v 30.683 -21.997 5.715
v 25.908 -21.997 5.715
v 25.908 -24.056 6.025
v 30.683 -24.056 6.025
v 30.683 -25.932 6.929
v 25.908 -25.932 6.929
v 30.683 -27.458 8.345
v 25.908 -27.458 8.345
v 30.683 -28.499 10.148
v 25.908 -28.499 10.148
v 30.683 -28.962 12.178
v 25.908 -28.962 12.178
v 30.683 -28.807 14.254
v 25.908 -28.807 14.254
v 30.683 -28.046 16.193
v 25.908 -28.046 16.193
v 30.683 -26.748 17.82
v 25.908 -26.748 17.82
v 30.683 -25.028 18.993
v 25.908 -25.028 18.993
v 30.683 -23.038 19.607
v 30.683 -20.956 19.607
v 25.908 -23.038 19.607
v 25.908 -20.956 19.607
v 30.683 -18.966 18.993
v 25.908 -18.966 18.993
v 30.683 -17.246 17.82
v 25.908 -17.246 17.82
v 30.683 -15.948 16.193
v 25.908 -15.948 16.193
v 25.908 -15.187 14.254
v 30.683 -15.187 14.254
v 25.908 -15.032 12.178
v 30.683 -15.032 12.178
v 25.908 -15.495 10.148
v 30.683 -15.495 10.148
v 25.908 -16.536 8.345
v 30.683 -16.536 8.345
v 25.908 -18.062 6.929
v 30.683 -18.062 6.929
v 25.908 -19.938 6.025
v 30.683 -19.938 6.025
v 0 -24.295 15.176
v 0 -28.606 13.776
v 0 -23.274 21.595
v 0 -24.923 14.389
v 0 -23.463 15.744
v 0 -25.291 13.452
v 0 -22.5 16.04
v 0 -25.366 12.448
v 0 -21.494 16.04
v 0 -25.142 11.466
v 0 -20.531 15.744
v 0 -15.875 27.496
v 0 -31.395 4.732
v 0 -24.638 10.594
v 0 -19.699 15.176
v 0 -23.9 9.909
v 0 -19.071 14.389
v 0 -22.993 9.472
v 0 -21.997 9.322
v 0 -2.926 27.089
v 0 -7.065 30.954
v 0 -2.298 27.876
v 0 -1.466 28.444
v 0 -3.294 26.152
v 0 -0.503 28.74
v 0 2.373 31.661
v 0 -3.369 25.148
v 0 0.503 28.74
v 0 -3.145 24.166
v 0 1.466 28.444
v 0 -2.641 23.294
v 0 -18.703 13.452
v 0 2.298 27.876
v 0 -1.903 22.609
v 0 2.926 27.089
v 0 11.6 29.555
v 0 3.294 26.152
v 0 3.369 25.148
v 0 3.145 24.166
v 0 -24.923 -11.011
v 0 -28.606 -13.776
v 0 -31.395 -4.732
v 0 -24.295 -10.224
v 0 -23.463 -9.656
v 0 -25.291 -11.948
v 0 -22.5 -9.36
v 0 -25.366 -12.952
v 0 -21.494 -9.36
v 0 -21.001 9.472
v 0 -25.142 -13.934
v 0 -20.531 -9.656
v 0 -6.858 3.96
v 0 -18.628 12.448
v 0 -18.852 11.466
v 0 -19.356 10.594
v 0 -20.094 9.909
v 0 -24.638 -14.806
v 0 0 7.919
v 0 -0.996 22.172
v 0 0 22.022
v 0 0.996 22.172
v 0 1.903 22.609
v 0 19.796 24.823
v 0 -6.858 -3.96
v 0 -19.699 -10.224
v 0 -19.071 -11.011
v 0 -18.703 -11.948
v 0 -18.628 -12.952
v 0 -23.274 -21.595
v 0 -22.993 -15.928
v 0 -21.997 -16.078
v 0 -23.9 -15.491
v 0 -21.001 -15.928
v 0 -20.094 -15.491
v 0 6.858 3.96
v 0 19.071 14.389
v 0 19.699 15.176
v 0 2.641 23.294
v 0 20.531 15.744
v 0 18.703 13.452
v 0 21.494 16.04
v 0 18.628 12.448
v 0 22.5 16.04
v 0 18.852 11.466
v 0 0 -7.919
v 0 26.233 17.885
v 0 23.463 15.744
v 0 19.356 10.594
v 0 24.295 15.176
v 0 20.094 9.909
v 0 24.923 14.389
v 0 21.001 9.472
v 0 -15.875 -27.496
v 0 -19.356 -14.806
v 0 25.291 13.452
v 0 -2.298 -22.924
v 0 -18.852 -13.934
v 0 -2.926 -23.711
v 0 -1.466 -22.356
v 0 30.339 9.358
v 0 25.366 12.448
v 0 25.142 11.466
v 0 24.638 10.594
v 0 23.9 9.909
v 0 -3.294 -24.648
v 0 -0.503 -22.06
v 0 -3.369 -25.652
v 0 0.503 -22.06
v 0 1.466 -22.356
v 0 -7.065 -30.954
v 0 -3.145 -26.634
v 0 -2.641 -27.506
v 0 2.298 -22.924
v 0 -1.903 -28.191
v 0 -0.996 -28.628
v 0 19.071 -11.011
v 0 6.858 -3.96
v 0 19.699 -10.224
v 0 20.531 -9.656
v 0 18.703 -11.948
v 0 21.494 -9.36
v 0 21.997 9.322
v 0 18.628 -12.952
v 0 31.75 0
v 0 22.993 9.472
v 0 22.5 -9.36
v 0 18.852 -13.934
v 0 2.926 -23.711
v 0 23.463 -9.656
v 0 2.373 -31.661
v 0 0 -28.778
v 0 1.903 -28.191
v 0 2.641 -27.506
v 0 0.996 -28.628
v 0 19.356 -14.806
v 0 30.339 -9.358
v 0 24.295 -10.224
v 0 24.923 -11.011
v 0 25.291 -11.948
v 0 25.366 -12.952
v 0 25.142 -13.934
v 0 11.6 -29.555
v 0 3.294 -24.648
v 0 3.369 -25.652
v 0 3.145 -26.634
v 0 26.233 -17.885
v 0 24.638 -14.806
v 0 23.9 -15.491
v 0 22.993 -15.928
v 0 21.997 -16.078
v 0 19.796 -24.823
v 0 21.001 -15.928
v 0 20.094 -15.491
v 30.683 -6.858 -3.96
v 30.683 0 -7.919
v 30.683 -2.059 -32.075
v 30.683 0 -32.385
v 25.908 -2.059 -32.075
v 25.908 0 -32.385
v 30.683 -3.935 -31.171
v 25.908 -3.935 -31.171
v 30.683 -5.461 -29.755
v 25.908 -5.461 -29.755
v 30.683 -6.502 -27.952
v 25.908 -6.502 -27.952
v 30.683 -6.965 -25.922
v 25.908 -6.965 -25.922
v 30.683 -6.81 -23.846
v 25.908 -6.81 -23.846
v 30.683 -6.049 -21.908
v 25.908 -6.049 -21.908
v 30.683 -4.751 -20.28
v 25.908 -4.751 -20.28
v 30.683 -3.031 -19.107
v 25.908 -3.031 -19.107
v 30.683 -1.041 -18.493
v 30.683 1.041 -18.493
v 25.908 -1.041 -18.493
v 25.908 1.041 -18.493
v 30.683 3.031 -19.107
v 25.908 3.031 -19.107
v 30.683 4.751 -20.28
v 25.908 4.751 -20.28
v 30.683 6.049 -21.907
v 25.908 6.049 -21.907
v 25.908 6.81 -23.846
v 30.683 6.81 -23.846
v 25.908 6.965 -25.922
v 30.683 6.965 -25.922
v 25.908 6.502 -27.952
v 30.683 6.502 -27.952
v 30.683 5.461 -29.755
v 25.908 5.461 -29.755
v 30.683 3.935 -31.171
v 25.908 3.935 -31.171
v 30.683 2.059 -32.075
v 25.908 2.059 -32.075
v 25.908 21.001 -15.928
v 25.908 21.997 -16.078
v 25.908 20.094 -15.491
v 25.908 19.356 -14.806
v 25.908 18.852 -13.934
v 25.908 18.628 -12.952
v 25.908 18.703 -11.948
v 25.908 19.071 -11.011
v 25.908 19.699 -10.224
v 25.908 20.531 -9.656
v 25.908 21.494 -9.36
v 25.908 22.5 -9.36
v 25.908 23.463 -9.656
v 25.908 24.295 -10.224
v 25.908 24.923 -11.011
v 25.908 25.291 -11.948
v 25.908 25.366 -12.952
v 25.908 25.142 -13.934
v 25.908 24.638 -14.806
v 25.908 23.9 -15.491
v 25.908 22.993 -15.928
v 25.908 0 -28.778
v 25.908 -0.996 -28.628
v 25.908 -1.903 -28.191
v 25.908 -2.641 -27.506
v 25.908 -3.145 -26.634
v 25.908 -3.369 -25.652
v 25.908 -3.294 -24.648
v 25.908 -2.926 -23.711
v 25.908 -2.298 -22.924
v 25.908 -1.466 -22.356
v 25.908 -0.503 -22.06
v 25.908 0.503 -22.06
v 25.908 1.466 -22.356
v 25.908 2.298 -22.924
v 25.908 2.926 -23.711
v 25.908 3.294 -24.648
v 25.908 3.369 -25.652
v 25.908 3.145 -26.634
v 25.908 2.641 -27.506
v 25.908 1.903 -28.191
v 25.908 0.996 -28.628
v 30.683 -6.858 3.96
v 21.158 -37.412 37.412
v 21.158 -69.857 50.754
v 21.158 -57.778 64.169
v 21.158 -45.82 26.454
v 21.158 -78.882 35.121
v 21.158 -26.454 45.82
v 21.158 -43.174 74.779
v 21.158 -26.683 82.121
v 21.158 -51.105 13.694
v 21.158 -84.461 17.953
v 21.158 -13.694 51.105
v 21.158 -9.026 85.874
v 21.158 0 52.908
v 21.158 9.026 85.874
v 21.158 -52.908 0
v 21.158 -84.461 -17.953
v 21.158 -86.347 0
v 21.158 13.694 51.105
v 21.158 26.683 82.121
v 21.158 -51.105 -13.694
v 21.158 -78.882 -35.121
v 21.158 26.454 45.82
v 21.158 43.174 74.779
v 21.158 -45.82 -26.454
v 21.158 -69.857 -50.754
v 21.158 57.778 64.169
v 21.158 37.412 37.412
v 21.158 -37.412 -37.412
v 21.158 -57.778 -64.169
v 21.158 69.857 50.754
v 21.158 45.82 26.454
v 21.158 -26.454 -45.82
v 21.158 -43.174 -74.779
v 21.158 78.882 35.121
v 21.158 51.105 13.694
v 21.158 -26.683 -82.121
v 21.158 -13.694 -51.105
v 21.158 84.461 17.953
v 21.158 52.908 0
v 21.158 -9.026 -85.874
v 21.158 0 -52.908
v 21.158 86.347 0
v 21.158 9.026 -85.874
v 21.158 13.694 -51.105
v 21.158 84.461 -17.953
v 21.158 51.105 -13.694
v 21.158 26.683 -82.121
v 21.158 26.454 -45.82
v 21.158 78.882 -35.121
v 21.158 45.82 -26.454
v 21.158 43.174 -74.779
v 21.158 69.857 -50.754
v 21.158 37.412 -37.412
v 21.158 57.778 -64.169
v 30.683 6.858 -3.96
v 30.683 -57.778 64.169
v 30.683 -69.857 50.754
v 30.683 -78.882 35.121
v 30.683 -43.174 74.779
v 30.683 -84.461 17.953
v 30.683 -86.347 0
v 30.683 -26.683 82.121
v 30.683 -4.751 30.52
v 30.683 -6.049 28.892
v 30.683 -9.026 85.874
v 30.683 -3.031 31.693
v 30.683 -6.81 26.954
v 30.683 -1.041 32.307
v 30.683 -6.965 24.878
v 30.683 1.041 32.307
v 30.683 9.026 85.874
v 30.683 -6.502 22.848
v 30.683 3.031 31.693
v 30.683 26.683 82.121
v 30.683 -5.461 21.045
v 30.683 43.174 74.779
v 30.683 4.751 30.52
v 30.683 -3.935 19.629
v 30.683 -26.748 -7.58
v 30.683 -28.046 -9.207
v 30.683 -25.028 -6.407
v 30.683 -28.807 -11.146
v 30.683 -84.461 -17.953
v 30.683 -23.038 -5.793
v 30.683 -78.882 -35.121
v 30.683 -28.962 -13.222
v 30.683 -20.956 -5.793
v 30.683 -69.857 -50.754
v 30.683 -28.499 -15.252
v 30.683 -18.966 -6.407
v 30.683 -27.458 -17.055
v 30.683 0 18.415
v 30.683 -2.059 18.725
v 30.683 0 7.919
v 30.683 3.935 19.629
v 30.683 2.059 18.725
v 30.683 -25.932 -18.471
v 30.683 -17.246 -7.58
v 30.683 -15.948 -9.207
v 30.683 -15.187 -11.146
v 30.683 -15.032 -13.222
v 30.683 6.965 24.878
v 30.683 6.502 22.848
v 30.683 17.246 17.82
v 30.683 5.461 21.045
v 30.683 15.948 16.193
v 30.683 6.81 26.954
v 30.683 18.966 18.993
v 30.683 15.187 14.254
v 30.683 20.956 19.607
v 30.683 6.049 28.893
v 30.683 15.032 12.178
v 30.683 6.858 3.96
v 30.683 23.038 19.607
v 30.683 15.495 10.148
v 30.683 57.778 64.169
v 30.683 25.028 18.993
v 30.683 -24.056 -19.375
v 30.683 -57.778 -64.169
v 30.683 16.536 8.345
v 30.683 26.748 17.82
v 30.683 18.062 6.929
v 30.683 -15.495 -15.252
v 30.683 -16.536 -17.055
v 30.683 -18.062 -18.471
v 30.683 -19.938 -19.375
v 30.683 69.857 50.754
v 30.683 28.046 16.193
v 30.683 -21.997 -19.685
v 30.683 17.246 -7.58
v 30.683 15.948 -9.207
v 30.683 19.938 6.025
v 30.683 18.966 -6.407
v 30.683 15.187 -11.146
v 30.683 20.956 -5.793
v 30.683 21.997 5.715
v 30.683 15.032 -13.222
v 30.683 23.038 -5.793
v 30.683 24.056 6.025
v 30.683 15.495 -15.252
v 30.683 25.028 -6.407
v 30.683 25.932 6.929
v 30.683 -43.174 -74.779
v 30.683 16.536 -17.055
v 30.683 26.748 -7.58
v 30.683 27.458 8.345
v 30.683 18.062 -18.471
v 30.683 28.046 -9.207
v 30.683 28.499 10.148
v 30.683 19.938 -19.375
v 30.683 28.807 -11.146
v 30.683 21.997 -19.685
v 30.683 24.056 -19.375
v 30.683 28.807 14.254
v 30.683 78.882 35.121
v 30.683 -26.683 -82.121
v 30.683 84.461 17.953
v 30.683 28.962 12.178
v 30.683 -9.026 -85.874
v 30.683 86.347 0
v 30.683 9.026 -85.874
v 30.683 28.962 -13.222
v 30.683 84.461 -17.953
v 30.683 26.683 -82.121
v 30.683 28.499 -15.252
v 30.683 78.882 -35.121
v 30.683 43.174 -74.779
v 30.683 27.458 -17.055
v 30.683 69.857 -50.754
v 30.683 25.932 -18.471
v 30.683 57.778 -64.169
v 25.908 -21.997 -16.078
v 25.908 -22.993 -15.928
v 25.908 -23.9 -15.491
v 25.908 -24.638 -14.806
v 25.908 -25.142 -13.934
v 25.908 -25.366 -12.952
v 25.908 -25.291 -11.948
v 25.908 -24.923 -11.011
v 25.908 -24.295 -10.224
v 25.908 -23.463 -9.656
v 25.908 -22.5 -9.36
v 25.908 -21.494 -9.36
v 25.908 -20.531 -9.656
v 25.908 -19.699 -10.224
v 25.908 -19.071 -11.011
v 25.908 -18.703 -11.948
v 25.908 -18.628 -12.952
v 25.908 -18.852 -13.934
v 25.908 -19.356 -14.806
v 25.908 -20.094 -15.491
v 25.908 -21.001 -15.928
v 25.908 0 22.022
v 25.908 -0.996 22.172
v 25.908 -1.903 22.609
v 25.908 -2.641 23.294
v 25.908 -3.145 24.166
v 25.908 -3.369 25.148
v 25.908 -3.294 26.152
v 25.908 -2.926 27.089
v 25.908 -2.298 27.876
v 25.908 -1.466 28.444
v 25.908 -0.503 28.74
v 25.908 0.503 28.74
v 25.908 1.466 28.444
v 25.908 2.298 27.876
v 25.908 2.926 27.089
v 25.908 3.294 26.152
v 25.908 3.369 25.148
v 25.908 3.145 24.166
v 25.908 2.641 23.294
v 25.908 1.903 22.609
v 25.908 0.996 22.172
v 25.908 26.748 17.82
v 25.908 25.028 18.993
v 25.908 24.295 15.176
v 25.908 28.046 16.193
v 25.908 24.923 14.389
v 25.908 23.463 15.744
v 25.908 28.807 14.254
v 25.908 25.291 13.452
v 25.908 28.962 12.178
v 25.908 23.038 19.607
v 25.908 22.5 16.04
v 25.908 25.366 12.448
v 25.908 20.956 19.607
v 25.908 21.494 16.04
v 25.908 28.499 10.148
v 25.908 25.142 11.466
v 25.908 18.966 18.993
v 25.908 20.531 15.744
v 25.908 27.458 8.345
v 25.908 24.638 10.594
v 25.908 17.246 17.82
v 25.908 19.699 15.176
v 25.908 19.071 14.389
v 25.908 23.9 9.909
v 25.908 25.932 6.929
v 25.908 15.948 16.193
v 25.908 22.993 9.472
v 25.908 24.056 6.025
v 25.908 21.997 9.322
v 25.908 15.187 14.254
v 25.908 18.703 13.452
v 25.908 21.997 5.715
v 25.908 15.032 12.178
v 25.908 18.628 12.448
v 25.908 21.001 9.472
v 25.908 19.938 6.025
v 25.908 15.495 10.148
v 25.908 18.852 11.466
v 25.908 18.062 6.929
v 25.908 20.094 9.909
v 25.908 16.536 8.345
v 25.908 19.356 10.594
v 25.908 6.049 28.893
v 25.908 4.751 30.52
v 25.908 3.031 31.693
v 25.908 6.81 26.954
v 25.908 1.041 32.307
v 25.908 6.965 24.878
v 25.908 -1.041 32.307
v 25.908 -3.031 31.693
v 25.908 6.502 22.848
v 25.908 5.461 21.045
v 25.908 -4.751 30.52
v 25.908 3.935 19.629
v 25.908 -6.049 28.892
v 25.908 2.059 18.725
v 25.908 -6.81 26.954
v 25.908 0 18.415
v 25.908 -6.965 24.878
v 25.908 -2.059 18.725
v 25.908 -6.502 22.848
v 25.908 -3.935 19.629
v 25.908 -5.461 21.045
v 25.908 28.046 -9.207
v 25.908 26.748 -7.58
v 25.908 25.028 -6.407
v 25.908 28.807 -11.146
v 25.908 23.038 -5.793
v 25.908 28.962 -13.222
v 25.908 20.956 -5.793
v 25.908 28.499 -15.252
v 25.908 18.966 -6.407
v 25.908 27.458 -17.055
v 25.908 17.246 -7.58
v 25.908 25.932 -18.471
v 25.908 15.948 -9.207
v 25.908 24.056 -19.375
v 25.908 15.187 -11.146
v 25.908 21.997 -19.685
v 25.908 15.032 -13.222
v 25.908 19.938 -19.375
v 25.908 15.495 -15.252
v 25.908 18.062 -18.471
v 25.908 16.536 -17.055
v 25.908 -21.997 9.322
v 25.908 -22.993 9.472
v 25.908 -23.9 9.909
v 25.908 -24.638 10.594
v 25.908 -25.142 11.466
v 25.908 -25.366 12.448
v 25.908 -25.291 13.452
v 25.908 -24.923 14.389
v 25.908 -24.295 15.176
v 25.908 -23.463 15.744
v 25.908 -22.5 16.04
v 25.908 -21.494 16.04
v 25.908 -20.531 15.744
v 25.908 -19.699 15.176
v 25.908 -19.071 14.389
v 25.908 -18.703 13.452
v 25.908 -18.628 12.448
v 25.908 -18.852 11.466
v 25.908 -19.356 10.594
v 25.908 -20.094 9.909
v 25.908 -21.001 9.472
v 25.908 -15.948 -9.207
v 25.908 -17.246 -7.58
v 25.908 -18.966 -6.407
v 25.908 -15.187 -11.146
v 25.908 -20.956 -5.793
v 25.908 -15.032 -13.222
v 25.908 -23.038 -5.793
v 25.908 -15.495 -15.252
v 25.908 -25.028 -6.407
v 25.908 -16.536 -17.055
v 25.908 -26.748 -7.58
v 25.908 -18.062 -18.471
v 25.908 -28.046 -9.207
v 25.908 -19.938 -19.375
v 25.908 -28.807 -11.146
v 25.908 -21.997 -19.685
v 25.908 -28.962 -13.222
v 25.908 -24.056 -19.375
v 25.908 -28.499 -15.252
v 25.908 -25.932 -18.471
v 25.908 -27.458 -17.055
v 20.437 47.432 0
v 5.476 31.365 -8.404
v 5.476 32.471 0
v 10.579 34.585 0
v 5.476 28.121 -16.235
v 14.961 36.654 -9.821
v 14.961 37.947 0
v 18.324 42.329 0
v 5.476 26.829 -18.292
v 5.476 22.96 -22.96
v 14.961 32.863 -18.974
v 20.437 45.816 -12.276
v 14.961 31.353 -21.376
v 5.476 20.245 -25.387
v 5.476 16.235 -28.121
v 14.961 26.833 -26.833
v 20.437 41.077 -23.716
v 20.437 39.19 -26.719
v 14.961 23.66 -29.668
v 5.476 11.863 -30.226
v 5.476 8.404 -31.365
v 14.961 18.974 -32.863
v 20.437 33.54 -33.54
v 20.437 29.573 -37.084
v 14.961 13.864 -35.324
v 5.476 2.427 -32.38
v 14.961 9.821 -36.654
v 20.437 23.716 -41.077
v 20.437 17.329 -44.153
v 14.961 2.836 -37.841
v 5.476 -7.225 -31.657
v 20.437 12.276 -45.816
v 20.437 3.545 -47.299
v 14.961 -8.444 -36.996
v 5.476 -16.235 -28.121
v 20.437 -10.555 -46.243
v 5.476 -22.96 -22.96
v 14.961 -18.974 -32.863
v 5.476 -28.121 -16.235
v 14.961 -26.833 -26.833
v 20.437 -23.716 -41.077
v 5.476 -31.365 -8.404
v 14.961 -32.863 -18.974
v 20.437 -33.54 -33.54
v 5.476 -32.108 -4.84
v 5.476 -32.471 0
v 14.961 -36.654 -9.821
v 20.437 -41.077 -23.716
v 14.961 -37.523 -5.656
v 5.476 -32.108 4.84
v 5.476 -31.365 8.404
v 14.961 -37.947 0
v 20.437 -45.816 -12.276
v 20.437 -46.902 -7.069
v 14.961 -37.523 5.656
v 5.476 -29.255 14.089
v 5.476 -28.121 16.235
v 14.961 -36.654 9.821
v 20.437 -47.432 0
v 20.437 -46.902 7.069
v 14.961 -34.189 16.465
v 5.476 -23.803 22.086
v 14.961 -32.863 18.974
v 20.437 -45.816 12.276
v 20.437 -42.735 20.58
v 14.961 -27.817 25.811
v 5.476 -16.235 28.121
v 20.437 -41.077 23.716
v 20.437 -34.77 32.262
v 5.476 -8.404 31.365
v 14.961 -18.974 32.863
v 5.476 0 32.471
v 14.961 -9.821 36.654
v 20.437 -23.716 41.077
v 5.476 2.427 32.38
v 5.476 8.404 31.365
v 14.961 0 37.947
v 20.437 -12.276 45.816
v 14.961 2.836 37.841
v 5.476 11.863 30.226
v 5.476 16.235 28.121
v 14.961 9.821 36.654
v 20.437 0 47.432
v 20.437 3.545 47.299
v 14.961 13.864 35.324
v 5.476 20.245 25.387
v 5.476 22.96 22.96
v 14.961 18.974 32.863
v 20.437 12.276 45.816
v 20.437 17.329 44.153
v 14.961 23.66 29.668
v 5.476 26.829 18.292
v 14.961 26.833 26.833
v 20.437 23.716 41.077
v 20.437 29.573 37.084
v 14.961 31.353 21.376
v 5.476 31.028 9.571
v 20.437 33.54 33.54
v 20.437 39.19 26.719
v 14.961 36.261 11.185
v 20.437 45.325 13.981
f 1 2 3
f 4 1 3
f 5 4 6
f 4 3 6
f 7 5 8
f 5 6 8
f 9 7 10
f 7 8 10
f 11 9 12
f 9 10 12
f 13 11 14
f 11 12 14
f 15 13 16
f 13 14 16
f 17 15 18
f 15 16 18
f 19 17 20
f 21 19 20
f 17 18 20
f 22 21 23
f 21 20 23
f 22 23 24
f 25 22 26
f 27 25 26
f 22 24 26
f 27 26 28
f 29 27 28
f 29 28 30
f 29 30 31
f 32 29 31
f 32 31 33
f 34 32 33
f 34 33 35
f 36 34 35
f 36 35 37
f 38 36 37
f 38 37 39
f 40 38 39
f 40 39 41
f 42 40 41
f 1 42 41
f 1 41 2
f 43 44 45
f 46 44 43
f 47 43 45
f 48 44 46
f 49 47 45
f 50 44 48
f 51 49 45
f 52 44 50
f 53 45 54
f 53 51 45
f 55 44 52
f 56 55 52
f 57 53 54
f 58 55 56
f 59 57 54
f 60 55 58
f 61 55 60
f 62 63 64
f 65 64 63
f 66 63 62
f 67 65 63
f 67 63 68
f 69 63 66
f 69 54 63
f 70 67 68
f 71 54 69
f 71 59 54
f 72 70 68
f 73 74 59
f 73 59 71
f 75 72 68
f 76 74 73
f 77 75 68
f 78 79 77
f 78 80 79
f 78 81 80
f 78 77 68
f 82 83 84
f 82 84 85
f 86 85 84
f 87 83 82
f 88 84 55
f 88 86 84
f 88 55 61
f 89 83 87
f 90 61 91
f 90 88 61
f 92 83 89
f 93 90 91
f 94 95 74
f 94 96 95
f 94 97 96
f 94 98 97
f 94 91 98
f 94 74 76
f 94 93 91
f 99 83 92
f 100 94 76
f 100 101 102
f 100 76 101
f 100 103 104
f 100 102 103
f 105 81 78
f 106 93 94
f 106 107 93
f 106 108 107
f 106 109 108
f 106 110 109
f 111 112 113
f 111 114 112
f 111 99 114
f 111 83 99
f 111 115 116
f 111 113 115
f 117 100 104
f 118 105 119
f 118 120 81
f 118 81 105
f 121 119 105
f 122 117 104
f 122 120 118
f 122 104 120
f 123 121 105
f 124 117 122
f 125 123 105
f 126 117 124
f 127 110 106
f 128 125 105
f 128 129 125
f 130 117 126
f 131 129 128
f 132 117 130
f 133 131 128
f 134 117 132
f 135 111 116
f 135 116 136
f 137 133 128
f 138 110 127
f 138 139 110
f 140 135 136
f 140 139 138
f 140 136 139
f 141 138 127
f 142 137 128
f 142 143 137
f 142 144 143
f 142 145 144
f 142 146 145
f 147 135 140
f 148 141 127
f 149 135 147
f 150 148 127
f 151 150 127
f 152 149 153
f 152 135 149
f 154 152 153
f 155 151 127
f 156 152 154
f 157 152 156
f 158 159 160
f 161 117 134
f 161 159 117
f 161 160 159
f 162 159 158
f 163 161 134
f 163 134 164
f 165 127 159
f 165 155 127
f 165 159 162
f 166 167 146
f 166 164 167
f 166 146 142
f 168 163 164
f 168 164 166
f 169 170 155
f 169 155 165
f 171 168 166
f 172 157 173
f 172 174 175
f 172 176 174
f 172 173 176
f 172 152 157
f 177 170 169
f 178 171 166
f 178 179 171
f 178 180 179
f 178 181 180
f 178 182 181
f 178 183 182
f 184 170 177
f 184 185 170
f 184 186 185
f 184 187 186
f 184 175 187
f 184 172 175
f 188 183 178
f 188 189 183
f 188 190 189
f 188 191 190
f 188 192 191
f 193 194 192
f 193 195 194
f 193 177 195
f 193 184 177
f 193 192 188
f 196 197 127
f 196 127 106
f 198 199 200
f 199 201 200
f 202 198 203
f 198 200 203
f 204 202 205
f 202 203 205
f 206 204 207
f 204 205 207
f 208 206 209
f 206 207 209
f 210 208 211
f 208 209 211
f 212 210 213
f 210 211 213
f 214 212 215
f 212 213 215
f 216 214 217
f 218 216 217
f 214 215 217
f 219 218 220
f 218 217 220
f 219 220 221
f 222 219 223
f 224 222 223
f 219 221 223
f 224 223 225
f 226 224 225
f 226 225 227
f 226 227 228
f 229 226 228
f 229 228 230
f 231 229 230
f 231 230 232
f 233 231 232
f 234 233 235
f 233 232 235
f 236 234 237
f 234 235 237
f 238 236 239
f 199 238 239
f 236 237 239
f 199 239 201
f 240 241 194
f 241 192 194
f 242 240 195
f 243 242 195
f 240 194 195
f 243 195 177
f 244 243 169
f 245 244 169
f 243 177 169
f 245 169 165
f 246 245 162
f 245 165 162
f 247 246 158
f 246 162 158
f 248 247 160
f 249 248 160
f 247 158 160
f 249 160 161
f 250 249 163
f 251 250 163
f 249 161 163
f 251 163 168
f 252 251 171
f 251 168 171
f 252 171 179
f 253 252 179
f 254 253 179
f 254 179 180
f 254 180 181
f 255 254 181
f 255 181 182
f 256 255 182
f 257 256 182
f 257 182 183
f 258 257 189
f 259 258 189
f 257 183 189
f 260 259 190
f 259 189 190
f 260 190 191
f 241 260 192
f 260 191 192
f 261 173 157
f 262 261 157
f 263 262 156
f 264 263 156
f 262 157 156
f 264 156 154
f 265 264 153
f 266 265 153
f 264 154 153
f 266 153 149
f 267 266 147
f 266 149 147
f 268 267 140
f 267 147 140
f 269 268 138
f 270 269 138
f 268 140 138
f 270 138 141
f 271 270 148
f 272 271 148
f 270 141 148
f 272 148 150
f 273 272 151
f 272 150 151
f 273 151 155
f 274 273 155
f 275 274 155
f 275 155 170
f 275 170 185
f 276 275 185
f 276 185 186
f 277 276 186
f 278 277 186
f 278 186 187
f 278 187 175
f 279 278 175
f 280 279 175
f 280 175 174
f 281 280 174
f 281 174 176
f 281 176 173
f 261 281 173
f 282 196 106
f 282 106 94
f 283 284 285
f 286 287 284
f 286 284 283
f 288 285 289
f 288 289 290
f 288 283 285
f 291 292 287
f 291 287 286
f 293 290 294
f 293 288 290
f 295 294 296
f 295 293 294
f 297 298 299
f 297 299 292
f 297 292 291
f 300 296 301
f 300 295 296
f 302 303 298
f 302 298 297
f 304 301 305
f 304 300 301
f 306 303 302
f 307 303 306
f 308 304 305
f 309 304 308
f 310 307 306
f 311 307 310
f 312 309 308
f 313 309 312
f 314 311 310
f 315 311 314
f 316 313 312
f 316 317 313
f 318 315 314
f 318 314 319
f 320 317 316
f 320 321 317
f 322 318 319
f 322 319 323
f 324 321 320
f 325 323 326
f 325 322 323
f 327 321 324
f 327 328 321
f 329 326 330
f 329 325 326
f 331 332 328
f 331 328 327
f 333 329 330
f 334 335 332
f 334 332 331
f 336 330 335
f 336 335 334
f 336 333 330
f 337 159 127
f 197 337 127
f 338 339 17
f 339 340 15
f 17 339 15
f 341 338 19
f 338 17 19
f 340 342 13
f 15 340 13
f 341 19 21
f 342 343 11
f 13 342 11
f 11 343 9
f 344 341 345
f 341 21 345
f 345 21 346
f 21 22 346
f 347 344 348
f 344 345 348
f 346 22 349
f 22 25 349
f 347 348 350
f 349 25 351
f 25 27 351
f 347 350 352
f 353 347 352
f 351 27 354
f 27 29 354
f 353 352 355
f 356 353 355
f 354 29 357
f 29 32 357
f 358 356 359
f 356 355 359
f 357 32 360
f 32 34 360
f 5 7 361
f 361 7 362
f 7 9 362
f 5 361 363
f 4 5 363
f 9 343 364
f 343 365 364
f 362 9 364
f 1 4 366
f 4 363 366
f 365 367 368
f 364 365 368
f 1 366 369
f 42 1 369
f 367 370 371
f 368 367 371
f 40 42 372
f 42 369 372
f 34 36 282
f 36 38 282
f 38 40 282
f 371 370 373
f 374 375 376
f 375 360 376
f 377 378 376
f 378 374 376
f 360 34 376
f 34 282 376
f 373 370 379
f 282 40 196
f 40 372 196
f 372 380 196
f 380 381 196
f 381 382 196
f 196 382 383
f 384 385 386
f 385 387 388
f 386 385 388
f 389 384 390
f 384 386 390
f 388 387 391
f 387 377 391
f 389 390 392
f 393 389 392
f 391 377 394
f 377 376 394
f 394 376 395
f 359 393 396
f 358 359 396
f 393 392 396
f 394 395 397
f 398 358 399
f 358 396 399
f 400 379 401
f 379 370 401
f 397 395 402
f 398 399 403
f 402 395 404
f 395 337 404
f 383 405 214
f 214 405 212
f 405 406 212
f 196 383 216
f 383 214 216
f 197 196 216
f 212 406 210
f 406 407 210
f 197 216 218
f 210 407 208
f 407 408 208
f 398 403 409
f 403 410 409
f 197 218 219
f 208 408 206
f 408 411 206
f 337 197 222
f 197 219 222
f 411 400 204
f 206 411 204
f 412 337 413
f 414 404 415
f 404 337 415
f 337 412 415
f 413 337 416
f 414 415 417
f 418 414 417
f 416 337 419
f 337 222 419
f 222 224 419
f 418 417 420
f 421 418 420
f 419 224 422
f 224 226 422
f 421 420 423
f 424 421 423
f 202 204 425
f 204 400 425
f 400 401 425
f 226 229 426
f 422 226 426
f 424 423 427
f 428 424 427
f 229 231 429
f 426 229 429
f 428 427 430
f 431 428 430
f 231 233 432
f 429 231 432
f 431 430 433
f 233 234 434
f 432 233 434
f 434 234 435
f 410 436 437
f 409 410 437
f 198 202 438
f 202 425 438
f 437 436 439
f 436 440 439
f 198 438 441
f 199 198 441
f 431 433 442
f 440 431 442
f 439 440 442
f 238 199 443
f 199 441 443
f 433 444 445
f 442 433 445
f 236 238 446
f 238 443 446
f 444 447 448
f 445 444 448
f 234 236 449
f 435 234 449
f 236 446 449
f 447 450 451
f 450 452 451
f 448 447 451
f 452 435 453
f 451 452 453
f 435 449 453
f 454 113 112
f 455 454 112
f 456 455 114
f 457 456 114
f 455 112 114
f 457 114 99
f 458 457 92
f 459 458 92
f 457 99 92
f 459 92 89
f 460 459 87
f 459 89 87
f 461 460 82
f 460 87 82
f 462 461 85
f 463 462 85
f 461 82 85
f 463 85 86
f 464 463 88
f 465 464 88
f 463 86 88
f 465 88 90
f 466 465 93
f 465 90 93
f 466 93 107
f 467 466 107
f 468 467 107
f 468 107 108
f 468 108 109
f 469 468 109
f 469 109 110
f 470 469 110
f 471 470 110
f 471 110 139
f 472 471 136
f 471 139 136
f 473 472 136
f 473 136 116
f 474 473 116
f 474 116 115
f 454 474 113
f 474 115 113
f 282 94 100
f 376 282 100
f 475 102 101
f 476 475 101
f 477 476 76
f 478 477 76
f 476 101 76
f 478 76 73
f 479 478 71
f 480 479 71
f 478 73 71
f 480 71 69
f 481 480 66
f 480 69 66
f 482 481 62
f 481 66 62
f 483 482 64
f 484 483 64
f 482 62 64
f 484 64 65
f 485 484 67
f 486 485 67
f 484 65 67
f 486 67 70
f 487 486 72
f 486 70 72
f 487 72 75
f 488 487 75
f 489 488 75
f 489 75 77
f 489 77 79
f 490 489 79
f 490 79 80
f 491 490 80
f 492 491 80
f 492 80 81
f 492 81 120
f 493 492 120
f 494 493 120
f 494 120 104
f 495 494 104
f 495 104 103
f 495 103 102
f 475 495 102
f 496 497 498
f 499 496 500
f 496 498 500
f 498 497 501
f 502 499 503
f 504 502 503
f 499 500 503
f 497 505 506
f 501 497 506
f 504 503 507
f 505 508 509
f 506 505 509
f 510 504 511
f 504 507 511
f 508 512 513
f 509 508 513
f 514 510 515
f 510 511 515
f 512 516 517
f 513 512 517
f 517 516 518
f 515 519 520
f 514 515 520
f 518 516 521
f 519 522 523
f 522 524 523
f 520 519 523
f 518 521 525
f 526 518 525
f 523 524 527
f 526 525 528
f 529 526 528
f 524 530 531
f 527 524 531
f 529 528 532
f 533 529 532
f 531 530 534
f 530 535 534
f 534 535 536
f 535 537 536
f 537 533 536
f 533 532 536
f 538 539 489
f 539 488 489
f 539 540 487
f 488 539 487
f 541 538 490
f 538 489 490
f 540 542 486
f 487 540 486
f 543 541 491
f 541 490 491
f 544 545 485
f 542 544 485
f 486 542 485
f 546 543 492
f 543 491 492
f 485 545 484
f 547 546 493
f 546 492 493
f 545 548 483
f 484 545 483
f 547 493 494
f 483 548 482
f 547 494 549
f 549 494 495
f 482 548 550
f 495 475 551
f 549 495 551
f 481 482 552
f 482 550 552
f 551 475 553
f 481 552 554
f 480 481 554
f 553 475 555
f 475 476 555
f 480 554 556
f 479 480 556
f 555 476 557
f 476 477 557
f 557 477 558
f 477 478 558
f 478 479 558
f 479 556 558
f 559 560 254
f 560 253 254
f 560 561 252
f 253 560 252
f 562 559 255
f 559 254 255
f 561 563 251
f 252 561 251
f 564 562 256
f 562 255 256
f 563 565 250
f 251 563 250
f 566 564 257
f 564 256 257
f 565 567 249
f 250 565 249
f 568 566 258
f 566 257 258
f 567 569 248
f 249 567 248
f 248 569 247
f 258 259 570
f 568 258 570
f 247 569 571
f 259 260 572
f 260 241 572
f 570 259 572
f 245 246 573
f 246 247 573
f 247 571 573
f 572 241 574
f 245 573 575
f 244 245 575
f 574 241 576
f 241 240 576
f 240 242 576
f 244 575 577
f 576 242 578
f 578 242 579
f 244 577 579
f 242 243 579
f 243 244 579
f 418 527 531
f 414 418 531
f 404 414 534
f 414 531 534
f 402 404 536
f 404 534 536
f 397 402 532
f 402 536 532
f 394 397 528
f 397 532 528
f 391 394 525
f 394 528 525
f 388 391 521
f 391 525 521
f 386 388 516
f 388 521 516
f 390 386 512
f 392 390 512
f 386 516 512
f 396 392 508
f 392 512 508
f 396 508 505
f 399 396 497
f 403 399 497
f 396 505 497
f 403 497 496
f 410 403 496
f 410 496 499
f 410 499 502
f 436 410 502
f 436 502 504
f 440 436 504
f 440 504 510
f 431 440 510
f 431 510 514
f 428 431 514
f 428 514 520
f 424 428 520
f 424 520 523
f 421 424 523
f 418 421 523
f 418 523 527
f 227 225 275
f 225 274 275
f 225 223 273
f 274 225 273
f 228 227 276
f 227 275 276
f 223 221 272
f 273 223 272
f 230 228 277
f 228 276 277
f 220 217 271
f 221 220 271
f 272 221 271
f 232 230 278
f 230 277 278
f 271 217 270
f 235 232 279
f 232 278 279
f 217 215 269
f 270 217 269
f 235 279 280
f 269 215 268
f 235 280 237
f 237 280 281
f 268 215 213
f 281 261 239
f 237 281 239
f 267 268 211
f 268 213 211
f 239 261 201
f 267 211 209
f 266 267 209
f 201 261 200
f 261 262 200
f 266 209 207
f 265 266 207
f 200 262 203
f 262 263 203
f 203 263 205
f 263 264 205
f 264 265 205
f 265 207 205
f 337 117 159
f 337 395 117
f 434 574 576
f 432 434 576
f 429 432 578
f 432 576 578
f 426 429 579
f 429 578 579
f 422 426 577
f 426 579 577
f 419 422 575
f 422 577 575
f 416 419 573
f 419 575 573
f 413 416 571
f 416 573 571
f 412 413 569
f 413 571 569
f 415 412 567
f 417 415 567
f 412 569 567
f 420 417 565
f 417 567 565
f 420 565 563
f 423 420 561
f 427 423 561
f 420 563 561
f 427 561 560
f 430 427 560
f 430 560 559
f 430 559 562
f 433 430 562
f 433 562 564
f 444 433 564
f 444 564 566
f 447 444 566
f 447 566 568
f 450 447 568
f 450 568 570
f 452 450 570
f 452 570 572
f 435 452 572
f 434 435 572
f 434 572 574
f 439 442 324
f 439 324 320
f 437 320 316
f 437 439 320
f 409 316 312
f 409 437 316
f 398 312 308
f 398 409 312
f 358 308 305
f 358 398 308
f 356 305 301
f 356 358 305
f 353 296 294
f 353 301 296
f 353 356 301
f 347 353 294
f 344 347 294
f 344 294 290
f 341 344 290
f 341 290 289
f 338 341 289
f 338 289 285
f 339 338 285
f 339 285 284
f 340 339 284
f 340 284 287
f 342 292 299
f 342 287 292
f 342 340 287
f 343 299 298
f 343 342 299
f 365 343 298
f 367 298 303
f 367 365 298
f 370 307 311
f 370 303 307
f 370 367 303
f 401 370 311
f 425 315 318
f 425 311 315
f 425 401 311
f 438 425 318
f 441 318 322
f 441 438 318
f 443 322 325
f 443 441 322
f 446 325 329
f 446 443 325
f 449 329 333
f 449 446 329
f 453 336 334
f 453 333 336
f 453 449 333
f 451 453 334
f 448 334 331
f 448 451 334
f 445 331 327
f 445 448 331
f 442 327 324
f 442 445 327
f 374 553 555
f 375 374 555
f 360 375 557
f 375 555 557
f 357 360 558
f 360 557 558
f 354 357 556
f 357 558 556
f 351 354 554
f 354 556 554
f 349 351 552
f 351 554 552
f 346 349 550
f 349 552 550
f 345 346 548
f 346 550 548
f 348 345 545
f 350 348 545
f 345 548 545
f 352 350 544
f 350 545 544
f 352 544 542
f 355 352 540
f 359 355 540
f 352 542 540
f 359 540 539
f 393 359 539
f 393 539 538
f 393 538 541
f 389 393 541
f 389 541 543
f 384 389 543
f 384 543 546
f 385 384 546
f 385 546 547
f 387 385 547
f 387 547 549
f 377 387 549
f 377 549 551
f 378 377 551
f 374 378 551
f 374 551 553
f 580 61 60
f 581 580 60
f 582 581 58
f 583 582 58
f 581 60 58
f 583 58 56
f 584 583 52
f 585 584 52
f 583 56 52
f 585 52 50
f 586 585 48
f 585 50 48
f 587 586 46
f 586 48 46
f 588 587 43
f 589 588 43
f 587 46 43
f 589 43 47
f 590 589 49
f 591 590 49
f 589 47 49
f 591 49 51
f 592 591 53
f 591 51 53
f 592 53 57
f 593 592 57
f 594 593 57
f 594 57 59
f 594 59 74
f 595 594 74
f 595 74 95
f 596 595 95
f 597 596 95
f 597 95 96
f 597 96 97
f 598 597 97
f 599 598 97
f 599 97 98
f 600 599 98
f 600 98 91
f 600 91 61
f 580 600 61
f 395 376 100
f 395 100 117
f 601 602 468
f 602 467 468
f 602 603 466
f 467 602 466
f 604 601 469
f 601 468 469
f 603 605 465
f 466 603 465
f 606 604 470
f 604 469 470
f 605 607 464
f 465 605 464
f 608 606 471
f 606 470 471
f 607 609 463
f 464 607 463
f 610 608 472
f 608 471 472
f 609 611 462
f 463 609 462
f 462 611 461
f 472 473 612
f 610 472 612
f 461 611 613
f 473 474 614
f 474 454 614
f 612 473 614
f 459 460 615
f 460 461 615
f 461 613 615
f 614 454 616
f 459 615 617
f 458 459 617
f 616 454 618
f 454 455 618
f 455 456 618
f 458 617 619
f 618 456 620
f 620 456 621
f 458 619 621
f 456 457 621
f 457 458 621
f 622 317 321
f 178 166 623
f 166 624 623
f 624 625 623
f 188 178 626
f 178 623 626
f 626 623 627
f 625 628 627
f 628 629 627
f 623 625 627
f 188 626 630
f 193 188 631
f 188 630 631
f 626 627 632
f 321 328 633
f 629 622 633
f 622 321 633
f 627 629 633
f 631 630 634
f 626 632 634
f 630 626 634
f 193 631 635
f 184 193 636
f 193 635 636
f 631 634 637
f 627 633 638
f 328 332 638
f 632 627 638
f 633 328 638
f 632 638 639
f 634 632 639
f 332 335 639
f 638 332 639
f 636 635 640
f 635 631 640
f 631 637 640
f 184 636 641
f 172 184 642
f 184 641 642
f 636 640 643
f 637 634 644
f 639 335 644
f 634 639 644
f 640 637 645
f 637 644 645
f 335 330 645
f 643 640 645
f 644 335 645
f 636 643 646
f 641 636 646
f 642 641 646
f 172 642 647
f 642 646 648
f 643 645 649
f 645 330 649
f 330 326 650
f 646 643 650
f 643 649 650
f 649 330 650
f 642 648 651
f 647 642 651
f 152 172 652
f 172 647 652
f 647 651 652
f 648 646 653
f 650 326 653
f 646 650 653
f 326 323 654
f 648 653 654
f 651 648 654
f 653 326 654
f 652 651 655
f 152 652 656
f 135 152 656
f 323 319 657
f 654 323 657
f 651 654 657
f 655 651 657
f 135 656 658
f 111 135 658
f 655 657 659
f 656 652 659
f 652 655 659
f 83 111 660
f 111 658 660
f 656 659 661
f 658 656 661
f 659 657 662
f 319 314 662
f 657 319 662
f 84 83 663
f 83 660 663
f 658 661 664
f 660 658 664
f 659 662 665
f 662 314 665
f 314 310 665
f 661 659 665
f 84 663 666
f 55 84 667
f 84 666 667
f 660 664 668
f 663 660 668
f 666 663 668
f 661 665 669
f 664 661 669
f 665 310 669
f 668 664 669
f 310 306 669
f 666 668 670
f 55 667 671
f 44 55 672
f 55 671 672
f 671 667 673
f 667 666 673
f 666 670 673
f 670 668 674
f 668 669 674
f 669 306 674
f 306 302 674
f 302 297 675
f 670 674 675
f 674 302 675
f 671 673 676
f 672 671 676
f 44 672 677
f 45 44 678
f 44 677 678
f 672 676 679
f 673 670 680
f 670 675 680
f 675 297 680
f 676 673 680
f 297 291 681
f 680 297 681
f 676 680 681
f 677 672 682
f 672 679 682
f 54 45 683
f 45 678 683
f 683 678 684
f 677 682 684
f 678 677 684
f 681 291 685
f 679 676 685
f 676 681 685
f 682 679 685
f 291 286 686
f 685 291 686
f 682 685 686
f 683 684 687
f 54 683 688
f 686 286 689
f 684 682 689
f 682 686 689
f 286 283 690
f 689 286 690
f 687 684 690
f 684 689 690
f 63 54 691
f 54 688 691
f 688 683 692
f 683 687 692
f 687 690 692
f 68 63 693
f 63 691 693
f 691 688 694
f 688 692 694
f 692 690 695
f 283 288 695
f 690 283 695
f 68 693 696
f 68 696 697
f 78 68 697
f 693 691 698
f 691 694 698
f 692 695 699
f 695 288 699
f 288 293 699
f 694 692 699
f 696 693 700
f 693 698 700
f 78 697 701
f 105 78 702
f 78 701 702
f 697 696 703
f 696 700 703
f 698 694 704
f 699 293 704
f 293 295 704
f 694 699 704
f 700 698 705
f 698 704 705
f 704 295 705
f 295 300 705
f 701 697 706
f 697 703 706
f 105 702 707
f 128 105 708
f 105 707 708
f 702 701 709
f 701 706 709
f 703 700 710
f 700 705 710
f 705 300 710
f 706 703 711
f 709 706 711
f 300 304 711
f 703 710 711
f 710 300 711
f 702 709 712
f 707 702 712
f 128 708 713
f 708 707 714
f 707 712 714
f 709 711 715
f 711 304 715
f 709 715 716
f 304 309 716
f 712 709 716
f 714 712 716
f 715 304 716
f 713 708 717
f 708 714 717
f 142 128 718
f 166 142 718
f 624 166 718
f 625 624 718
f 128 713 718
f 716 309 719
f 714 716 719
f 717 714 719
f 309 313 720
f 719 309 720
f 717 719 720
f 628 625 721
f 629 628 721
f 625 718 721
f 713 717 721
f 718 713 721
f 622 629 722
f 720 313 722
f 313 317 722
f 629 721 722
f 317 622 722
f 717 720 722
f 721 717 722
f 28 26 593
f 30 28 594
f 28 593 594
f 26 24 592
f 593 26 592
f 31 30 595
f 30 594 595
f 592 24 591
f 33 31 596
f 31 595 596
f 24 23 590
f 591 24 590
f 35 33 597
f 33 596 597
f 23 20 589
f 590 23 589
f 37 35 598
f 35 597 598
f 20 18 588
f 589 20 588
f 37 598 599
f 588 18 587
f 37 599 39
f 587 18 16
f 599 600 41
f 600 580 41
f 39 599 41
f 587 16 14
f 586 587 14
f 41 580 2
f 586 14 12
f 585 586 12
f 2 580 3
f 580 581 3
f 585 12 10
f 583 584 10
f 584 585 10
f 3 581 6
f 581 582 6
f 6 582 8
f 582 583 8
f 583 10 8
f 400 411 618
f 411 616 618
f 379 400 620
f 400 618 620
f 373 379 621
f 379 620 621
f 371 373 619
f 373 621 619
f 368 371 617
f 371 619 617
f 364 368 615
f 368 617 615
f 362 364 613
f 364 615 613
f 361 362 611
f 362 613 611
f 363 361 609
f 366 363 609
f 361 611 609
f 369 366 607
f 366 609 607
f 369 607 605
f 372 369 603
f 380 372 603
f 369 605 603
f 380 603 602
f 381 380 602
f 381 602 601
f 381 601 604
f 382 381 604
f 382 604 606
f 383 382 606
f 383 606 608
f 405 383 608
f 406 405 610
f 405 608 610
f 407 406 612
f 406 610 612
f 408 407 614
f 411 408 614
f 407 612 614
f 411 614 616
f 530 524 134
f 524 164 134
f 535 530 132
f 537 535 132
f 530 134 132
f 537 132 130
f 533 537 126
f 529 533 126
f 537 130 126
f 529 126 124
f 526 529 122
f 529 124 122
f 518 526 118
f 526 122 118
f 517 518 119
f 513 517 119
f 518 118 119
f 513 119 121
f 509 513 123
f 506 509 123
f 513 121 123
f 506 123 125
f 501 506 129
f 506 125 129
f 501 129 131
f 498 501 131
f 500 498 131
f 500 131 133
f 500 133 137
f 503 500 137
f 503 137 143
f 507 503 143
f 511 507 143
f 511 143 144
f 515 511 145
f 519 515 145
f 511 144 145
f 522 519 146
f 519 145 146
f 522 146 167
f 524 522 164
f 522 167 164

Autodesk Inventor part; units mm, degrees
ref_plane "YZ Plane" through (0, 0, 0) normal (1, 0, 0) x (0, 1, 0)
ref_plane "XZ Plane" through (0, 0, 0) normal (0, 1, 0) x (-1, 0, 0)
ref_plane "XY Plane" through (0, 0, 0) normal (0, 0, 1) x (1, 0, 0)
sketch "Sketch1" plane through (0, 0, 0) normal (0, 0, 1) x (1, 0, 0)
  arc A0 (0, 31.75) -> (21.1582, 52.9082) centre (0, 52.9082) ccw
  line L0 (0, 31.75) -> (38.8128, 31.75) construction
  line L1 (30.6832, 0) -> (30.6832, 86.3474)
  line L2 (21.1582, 52.9082) -> (21.1582, 86.3474)
  line L3 (21.1582, 86.3474) -> (30.6832, 86.3474)
  line L4 (0, 79.9974) -> (0, 0) construction
  line L5 (0, 31.75) -> (0, 0)
  line L6 (30.6832, 0) -> (0, 0)
  dimension "pipeDiameter" = 42.3164
  dimension "d1" = 31.75
  dimension "width" = 9.525
revolve "Revolution1" add sketch "Sketch1" angle 360 about axis through (30.6832, 0, 0) along (-1, 0, 0)
sketch "Sketch2" plane through (30.6832, 0, 0) normal (1, 0, 0) x (0, 0, -1)
  line L0 (-3.9595, 6.858) -> (3.9595, 6.858)
  line L1 (3.9595, 6.858) -> (7.9189, 0)
  line L2 (7.9189, 0) -> (3.9595, -6.858)
  line L3 (3.9595, -6.858) -> (-3.9595, -6.858)
  line L4 (-3.9595, -6.858) -> (-7.9189, 0)
  line L5 (-7.9189, 0) -> (-3.9595, 6.858)
  point P0 (0, 0)
  point P1 (0, 0)
  dimension "hexWidth" = 13.716
extrude "Extrusion1" cut sketch "Sketch2" against normal through all
sketch "Sketch3" plane through (30.6832, 0, 0) normal (1, 0, 0) x (0, 0, -1)
  point P0 (0, 0)
  point P1 (-25.4, 0)
  point P2 (-12.7, -21.997)
  point P3 (12.7, -21.997)
  point P4 (25.4, 0)
  point P5 (12.7, 21.997)
  point P6 (-12.7, 21.997)
  dimension "d7" = 25.4
  dimension "d10" = 360
hole "Hole1" at (30.6832, 0, 25.4) at (30.6832, -21.997, 12.7) at (30.6832, -21.997, -12.7) at (30.6832, 0, -25.4) at (30.6832, 21.997, -12.7) at (30.6832, 21.997, 12.7) direction (-1, 0, 0) diameter 6.7564 end through all counterbore diameter 13.97 counterbore depth 4.7752 clearance for "Hex Head Bolt" size "1/4" standard "Ansi Unified Screw Threads"
properties part number "halfWheelForHangingAndMovingV2"
